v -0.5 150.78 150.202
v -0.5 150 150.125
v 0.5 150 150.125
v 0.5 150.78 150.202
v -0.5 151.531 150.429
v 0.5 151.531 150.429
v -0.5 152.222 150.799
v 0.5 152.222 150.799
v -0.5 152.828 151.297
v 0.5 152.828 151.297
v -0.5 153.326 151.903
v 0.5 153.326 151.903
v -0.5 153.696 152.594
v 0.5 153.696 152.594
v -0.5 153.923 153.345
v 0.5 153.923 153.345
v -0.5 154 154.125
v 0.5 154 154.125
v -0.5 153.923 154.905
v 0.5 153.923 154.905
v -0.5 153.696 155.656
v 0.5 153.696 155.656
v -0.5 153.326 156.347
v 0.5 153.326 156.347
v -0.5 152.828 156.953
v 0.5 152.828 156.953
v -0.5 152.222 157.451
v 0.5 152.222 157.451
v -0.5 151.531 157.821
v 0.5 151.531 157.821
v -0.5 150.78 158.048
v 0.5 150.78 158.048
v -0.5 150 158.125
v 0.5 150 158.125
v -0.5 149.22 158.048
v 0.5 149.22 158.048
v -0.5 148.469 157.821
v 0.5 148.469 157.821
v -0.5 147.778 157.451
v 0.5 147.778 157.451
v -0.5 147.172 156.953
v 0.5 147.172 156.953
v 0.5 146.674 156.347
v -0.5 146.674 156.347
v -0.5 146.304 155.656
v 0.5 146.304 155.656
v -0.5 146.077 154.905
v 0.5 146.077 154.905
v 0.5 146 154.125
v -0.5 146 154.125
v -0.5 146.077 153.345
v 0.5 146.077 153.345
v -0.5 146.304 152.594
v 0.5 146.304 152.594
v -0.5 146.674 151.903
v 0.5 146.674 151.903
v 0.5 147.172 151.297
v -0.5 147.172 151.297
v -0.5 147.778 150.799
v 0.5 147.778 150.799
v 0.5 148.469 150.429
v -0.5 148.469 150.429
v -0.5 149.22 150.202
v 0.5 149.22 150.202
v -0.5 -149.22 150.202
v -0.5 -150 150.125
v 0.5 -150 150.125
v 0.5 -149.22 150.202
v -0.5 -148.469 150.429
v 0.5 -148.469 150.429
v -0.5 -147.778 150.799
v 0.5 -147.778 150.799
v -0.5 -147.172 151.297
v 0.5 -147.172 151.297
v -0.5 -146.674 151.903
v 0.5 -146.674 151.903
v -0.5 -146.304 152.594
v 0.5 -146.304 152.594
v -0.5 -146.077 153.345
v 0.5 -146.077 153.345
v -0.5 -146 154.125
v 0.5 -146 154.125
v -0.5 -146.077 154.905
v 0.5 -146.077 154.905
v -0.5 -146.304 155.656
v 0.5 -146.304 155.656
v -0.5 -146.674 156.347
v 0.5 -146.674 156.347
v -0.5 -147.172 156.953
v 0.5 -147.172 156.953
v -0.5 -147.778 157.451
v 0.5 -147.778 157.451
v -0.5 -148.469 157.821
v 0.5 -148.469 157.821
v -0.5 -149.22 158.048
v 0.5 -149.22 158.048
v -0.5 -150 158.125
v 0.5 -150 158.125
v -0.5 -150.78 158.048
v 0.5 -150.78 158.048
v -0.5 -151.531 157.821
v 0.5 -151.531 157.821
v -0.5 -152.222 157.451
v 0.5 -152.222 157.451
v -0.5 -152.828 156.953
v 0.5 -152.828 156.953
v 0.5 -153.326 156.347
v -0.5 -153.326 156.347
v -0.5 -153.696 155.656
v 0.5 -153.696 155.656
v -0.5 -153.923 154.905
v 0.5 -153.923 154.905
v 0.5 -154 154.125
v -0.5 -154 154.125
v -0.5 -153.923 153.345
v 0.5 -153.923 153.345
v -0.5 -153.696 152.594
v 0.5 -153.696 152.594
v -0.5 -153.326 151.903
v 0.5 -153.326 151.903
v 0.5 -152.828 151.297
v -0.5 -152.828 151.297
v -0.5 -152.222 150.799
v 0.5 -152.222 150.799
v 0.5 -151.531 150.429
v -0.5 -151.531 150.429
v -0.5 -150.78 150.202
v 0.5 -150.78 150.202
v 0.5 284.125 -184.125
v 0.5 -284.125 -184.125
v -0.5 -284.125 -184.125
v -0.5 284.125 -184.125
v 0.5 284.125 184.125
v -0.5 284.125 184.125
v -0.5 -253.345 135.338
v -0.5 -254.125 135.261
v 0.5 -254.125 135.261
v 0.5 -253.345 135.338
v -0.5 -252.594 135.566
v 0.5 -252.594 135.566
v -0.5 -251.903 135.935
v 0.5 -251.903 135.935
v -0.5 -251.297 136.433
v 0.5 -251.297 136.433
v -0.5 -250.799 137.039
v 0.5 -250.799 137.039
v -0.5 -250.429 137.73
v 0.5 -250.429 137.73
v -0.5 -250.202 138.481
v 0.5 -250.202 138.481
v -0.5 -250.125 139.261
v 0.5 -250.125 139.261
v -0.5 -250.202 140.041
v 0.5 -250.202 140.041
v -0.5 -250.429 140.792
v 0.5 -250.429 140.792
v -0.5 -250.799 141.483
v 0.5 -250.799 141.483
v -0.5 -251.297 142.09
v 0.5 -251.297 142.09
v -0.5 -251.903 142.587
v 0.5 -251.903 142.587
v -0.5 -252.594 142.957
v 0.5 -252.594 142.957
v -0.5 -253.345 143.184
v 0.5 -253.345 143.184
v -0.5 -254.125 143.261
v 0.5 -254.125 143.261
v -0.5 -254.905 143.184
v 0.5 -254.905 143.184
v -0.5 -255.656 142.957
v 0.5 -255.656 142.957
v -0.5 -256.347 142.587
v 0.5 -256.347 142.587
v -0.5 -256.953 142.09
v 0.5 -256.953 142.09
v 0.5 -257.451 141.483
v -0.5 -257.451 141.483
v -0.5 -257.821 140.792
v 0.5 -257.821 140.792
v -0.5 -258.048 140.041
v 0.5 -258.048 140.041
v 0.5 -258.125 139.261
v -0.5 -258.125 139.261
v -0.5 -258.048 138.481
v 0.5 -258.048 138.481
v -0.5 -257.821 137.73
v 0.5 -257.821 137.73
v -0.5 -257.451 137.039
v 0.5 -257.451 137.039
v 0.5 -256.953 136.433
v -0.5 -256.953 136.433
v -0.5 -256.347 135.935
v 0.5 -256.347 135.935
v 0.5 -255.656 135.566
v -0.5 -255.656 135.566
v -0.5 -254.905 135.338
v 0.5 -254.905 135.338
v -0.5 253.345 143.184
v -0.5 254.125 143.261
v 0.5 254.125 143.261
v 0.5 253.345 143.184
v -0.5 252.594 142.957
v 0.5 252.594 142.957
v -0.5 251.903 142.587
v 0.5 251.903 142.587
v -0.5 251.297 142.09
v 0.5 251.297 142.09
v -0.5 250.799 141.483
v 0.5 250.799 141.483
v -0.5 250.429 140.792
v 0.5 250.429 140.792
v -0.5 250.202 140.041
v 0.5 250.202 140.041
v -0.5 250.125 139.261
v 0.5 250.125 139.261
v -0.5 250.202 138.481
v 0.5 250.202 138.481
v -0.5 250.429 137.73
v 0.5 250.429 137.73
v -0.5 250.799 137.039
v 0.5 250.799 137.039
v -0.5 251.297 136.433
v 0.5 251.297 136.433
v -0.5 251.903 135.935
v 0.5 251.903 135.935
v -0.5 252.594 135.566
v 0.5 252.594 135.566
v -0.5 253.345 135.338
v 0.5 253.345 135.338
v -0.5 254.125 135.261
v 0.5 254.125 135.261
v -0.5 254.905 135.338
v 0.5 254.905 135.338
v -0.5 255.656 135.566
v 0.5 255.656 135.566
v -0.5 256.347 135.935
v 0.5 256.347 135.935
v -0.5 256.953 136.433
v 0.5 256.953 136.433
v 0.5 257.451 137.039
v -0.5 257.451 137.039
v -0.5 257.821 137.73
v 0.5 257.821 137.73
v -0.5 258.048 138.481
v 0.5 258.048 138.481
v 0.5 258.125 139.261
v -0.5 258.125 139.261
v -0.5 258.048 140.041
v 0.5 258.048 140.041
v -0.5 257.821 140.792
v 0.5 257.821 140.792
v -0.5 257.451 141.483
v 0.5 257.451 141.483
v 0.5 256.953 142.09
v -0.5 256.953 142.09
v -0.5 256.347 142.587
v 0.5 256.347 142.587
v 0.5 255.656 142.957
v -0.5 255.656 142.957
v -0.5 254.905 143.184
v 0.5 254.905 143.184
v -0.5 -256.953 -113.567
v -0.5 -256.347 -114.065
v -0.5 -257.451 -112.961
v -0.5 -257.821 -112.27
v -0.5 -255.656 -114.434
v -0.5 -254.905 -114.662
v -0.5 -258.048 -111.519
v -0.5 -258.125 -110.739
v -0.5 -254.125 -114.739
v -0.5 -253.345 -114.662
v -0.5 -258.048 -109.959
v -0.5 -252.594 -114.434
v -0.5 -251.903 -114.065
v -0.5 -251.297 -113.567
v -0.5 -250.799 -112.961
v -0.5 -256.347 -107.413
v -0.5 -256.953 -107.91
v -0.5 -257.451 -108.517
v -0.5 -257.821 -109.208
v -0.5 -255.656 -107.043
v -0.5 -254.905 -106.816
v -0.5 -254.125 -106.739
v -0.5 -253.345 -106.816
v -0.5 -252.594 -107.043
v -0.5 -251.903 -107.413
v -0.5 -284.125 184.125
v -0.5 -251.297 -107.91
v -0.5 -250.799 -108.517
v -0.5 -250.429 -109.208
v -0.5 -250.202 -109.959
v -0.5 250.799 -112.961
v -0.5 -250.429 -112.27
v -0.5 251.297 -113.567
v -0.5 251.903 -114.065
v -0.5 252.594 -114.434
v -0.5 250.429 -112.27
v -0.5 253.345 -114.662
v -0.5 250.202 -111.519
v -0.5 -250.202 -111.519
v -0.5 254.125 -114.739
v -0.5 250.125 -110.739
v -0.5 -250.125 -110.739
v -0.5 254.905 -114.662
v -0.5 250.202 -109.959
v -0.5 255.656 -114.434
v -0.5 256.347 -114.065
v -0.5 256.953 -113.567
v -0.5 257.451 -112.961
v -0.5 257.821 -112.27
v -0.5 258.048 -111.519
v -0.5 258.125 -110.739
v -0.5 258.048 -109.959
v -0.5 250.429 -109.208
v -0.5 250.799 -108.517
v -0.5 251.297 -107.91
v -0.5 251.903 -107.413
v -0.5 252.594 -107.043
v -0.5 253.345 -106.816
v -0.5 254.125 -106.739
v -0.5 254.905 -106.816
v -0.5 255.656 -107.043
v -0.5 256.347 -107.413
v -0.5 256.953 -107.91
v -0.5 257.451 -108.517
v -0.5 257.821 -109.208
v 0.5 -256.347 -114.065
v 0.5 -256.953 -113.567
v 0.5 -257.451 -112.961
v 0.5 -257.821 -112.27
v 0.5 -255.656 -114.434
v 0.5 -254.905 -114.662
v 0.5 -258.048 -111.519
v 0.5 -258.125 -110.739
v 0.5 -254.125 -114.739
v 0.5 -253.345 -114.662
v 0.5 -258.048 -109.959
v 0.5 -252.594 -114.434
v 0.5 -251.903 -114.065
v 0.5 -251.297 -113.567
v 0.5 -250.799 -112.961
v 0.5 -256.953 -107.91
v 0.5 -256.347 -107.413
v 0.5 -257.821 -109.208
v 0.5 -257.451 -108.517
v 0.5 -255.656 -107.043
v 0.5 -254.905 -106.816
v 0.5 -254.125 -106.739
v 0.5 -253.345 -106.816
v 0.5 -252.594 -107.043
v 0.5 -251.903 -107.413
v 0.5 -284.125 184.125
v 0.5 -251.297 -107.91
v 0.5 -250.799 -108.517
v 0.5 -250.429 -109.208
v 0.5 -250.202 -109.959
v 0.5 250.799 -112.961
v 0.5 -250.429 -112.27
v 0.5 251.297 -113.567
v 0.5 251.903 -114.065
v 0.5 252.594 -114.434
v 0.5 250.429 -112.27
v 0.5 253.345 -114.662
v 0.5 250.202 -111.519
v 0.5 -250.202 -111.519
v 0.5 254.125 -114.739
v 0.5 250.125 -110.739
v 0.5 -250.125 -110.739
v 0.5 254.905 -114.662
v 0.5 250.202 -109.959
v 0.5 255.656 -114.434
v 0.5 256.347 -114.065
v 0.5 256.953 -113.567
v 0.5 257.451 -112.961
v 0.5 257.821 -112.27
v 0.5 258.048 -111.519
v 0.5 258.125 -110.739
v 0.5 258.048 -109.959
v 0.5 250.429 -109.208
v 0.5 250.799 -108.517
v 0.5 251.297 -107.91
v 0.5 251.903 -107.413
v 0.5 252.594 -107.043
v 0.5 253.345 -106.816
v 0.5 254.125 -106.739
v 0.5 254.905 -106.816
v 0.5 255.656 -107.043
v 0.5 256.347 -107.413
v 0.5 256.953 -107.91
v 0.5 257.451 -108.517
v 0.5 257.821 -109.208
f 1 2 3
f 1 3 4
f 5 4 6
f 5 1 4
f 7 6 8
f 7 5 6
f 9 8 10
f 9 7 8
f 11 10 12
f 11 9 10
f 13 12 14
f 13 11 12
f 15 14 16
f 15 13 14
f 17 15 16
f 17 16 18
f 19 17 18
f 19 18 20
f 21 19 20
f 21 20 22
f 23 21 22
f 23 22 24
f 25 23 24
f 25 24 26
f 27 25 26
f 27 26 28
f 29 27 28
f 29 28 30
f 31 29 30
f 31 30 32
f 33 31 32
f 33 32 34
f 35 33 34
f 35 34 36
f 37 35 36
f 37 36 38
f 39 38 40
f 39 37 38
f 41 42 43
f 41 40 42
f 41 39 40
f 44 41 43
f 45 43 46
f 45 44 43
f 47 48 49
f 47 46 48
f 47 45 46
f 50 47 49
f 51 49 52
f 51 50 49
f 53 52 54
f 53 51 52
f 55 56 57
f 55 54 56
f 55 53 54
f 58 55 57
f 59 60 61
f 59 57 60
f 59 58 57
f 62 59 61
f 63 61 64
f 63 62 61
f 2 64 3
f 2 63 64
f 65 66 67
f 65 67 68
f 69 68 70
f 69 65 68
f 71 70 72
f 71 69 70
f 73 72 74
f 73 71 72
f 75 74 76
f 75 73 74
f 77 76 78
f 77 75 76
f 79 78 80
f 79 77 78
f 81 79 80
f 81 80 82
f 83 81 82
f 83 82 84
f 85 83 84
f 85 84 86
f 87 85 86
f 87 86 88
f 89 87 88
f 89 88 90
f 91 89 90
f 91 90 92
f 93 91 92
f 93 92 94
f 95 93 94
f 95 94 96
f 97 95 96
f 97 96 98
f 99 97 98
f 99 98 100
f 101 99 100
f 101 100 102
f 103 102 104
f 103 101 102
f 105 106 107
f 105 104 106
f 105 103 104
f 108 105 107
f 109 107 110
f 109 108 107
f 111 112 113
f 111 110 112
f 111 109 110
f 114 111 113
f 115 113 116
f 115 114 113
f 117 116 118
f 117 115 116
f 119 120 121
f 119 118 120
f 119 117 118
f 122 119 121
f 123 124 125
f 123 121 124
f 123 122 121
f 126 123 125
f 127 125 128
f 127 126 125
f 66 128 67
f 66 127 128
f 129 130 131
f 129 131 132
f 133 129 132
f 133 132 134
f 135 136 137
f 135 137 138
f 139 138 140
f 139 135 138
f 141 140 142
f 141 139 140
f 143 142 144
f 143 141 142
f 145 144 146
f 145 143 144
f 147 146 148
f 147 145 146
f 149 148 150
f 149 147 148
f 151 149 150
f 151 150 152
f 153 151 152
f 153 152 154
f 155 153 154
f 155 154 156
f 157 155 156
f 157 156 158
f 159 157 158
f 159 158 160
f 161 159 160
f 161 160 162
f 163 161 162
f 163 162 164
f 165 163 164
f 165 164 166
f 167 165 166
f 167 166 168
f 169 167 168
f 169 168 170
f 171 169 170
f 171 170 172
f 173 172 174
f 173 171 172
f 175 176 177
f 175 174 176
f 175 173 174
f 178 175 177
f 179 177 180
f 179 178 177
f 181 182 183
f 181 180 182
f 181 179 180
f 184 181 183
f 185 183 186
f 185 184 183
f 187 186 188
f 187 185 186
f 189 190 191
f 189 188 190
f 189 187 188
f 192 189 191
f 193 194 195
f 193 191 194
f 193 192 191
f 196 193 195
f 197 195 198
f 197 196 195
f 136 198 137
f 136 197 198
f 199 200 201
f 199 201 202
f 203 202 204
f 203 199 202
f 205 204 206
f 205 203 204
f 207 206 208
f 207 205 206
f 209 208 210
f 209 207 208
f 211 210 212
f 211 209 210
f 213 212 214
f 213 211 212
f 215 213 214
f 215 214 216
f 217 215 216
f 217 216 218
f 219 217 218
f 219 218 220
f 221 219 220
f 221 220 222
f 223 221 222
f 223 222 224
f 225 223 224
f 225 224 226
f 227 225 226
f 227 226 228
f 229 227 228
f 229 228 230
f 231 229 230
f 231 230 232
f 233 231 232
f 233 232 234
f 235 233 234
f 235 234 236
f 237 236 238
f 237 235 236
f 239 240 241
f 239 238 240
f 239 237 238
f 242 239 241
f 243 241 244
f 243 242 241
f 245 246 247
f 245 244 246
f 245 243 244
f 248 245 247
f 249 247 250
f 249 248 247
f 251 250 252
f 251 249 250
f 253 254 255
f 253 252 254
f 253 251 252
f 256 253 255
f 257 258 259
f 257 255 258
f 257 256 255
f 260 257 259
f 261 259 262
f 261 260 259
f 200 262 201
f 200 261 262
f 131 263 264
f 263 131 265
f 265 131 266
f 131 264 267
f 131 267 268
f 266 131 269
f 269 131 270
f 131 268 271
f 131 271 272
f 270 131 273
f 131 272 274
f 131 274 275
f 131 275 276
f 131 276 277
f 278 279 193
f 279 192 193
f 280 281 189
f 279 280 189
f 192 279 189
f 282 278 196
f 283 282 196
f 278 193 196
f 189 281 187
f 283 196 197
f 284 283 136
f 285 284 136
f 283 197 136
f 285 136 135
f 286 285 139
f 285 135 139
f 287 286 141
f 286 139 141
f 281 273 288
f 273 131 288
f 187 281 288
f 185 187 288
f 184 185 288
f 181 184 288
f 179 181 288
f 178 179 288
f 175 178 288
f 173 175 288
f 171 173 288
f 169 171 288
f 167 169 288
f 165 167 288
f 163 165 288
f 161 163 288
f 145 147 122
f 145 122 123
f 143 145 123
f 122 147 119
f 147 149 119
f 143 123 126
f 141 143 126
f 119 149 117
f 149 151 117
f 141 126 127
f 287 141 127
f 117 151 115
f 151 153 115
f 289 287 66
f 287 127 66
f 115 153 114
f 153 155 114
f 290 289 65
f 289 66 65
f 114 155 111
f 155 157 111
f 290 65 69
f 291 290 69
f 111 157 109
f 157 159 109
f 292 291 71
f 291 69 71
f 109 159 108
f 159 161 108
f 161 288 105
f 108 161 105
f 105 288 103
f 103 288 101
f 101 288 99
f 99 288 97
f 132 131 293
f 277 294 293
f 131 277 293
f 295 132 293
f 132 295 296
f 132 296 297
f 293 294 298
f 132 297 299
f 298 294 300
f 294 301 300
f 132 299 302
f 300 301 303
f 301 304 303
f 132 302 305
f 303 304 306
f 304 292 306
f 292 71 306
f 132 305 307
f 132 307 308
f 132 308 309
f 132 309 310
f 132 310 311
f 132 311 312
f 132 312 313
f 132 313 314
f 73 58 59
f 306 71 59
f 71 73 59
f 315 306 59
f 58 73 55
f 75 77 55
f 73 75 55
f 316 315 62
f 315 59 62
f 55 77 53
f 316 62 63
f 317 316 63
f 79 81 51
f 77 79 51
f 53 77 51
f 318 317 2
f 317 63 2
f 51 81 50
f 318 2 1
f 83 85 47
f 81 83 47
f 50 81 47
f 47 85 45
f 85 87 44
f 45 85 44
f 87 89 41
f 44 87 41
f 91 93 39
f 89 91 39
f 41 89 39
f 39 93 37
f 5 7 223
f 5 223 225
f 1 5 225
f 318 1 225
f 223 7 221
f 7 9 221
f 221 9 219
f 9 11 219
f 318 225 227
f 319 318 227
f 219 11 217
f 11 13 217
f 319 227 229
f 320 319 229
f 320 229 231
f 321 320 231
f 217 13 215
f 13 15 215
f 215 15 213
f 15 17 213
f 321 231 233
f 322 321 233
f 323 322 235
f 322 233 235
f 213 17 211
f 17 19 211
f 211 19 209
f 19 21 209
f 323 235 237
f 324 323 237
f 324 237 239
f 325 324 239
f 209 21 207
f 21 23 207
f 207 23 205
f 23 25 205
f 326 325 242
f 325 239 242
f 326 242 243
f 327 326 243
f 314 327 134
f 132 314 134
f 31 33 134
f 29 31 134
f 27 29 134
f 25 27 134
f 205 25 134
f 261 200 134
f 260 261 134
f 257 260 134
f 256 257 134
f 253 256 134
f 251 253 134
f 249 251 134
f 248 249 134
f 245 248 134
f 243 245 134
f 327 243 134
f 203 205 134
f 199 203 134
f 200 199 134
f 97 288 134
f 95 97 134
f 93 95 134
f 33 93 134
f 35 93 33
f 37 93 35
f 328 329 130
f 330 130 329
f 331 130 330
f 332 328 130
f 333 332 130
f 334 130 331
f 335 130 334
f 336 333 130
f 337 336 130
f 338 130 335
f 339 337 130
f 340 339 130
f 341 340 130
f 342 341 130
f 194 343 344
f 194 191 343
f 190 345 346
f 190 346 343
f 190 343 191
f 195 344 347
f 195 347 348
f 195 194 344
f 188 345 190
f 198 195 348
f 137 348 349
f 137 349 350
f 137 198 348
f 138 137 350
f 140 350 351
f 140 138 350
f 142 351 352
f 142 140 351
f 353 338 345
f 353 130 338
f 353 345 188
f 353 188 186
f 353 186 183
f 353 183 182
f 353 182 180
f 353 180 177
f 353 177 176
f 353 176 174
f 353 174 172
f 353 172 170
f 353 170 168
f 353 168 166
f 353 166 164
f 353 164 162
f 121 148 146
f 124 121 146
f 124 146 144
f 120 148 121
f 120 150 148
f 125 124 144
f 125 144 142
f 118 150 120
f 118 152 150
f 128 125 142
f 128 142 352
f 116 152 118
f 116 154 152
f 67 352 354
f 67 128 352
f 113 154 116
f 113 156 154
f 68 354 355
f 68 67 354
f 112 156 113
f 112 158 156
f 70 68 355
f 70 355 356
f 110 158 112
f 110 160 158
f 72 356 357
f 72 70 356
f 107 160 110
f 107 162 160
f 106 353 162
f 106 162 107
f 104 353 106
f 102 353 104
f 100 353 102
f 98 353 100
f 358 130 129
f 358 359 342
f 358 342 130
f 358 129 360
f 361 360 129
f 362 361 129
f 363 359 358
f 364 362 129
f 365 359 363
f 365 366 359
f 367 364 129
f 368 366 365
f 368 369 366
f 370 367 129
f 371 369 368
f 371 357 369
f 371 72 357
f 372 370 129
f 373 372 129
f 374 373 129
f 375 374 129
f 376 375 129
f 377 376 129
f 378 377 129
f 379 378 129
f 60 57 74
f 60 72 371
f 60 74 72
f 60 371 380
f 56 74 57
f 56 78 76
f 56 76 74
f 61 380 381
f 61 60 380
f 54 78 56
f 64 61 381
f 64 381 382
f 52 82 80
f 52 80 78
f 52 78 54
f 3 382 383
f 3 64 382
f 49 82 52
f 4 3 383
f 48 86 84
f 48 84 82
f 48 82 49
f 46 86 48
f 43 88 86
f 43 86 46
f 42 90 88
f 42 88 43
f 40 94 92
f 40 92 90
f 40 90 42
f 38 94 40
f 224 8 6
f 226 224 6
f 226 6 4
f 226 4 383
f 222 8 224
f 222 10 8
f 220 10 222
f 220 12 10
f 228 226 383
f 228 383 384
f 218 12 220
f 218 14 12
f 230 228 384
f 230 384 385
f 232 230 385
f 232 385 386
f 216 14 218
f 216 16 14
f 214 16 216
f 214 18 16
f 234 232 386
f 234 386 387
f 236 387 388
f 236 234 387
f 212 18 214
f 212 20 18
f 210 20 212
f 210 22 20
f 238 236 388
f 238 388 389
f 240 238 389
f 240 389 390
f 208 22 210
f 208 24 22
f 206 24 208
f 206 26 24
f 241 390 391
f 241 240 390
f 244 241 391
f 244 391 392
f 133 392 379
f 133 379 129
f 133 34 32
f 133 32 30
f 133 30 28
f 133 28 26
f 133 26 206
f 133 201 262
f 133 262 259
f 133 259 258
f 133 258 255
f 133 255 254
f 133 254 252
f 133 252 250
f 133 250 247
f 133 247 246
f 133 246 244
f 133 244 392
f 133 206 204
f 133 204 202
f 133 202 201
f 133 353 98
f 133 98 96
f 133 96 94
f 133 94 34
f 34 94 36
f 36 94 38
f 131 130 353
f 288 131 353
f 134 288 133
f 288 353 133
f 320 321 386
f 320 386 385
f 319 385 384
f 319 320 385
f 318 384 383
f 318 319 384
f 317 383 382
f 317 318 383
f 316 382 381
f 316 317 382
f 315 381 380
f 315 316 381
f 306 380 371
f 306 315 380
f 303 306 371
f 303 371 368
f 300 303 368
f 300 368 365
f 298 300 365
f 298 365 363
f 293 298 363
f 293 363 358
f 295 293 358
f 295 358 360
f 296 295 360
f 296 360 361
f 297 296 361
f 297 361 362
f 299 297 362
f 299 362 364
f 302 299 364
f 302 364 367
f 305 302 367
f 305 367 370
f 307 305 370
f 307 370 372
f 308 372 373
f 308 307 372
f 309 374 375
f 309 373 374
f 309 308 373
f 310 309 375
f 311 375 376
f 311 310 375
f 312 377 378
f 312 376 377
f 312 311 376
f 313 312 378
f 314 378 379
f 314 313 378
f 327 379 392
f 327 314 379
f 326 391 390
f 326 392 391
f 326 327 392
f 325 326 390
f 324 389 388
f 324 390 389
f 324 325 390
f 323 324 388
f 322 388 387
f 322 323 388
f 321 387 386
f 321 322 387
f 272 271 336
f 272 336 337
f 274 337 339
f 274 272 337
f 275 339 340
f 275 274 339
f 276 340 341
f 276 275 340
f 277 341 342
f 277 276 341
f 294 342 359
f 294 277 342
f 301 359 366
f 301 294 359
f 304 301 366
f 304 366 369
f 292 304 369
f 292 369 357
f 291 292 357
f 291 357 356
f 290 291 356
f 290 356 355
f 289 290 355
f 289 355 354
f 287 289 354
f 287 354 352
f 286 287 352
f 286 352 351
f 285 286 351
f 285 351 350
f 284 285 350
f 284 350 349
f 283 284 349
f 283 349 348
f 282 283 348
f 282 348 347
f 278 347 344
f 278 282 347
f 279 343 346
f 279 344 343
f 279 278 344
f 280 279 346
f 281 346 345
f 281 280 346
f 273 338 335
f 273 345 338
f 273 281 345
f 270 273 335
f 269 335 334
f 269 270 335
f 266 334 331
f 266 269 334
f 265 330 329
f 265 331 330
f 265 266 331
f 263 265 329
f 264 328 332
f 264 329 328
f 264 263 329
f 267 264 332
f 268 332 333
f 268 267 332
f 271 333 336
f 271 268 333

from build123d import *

# Parameters (mm, degrees)
SKETCH1_W               = 568.25
SKETCH1_H               = 368.25
BOSS_EXTRUDE1_DEPTH     = 0.5
CUT_EXTRUDE1_DEPTH      = 339.570570561
CUT_EXTRUDE1_DEPTH_BACK = 339.570570561
SKETCH2_R               = 4


with BuildPart() as part:
    # Sketch1 → Boss-Extrude1 (new, symmetric)
    with BuildSketch(Plane.YZ):
        Rectangle(SKETCH1_W, SKETCH1_H)
    extrude(amount=BOSS_EXTRUDE1_DEPTH, both=True)

    # Sketch2 → Cut-Extrude1 (cut, two sides: drawn at the far end of the back side and taken through both)
    with BuildSketch(Plane(origin=(0.5, 0, 0), x_dir=(0, 0, -1), z_dir=(1, 0, 0)).offset(-CUT_EXTRUDE1_DEPTH_BACK)):
        with Locations((-154.125, 150)):
            Circle(SKETCH2_R)
        with Locations((-154.125, -150)):
            Circle(SKETCH2_R)
        with Locations((-139.261087025, -254.125)):
            Circle(SKETCH2_R)
        with Locations((110.738912975, -254.125)):
            Circle(SKETCH2_R)
        with Locations(Location((110.738912975, 254.125, 0), (0, 0, 180))):
            Circle(SKETCH2_R)
        with Locations(Location((-139.261087025, 254.125, 0), (0, 0, 180))):
            Circle(SKETCH2_R)
    extrude(amount=CUT_EXTRUDE1_DEPTH + CUT_EXTRUDE1_DEPTH_BACK, mode=Mode.SUBTRACT)


solid = part.part
